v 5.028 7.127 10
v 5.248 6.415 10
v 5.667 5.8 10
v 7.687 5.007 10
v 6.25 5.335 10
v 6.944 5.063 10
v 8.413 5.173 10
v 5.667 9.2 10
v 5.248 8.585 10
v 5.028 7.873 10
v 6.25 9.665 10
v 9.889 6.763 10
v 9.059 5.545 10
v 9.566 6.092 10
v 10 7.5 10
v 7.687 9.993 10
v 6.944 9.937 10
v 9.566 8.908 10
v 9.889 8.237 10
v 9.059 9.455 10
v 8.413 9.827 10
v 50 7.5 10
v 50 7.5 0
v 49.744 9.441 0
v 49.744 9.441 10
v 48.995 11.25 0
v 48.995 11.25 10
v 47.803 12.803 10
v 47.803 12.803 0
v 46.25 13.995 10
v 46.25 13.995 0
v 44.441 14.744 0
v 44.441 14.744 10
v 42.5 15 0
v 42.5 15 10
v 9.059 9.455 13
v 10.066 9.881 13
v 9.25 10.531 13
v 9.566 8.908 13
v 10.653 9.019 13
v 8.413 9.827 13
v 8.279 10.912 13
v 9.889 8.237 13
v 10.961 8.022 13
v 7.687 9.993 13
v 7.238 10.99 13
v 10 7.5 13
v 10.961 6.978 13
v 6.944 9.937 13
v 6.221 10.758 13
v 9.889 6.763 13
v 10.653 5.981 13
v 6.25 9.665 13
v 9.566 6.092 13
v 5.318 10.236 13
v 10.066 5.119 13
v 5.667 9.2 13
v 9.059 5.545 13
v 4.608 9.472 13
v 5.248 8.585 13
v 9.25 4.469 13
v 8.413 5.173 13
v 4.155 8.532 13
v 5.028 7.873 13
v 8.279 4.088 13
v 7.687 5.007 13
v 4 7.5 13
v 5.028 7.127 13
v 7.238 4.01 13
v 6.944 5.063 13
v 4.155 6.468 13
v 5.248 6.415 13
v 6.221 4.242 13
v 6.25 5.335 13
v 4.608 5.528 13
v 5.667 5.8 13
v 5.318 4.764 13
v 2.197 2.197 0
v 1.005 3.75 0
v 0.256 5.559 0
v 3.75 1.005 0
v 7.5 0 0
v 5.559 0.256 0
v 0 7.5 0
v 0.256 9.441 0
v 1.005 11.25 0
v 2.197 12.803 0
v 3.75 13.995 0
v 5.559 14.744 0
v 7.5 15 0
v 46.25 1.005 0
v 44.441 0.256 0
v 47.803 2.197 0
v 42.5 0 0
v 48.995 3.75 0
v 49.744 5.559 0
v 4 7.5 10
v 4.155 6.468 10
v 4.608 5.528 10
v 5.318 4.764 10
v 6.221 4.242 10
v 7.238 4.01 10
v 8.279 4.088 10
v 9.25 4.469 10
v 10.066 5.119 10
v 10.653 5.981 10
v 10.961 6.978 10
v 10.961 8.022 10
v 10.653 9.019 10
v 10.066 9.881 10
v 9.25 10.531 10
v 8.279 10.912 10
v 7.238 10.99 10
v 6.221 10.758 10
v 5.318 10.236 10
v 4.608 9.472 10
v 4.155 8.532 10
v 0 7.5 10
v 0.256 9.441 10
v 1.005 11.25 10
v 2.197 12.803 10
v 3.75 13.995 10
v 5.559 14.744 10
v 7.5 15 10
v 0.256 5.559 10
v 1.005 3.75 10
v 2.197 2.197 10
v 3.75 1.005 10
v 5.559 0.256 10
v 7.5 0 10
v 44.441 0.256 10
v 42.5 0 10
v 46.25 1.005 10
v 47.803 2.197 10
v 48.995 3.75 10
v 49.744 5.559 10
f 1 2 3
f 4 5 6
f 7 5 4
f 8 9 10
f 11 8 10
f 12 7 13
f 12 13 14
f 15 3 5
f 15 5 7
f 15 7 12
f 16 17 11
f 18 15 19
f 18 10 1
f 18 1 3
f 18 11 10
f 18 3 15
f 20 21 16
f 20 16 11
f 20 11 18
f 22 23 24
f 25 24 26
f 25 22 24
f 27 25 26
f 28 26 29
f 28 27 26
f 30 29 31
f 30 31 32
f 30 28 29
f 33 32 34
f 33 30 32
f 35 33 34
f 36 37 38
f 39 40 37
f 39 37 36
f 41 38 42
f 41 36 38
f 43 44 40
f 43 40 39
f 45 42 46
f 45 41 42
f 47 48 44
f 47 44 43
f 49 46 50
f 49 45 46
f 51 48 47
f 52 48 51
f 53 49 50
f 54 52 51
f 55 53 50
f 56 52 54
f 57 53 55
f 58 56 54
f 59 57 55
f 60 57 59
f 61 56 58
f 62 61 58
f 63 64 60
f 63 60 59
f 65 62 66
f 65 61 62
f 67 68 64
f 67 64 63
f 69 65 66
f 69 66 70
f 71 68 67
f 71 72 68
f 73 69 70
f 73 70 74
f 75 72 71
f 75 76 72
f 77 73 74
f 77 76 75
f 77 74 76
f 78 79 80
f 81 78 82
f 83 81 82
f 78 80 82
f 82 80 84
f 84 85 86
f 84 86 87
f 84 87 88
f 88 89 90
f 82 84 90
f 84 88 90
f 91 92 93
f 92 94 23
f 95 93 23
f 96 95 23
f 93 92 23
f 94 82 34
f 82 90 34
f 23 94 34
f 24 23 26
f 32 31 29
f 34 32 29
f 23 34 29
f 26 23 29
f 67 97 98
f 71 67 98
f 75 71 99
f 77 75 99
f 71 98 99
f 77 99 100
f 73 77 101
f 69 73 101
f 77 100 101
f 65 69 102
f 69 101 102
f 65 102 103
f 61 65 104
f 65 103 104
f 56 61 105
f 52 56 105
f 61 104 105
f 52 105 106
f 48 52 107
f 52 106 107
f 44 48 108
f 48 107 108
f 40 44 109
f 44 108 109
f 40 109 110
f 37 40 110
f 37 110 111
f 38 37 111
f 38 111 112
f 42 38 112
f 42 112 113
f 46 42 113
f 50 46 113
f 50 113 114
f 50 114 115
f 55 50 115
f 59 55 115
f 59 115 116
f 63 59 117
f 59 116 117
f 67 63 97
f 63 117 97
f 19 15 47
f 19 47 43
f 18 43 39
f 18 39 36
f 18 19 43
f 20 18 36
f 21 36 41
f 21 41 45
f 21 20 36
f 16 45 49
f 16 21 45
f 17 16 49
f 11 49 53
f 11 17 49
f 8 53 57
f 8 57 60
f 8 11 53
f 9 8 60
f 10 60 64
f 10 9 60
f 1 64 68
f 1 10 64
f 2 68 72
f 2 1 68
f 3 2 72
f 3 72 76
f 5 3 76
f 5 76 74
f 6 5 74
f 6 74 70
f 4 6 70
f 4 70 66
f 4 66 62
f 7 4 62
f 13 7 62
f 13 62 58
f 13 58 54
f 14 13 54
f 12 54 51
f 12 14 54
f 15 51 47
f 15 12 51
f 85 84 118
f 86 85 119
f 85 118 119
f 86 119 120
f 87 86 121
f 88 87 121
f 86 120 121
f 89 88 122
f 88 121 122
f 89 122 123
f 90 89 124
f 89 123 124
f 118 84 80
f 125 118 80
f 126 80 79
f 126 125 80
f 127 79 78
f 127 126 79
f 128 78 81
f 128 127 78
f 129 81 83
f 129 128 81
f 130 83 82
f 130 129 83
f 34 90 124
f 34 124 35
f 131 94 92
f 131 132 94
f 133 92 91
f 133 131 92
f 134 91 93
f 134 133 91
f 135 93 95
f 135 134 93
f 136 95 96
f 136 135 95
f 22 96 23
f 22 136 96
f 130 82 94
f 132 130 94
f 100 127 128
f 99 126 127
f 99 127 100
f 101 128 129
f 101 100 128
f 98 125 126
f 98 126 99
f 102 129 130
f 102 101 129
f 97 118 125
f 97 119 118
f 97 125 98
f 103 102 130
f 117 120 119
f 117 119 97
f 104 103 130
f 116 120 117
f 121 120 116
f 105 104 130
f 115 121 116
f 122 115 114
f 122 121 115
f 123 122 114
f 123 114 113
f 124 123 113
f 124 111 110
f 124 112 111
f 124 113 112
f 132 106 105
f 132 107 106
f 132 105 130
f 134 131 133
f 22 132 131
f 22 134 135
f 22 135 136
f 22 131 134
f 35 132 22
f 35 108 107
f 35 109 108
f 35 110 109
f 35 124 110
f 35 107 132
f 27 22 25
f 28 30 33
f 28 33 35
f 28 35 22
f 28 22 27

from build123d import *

# Parameters (mm, degrees)
SKETCH1_W           = 50
SKETCH1_H           = 15
BOSS_EXTRUDE1_DEPTH = 10
FILLET1_R           = 7.5
SKETCH2_R           = 3.5
SKETCH2_R_2         = 2.5
BOSS_EXTRUDE2_DEPTH = 3


with BuildPart() as part:
    # Sketch1 → Boss-Extrude1 (new body)
    with BuildSketch(Plane.XY):
        with Locations((25, 7.5)):
            Rectangle(SKETCH1_W, SKETCH1_H)
    extrude(amount=BOSS_EXTRUDE1_DEPTH)

    # Fillet1
    fillet1_edges = [part.edges().sort_by_distance(p)[0] for p in [
        (50, 0, 5),
        (50, 15, 5),
        (0, 0, 5),
        (0, 15, 5),
    ]]
    fillet(fillet1_edges, radius=FILLET1_R - 0.0001)  # a hair under: the kernel refuses the full size

    # Sketch2 → Boss-Extrude2 (add)
    with BuildSketch(Plane.XY.offset(10)):
        with Locations(Location((7.5, 7.5, 0), (0, 0, 180))):
            Circle(SKETCH2_R)
        with Locations((7.5, 7.5)):
            Circle(SKETCH2_R_2, mode=Mode.SUBTRACT)
    extrude(amount=BOSS_EXTRUDE2_DEPTH)


solid = part.part
